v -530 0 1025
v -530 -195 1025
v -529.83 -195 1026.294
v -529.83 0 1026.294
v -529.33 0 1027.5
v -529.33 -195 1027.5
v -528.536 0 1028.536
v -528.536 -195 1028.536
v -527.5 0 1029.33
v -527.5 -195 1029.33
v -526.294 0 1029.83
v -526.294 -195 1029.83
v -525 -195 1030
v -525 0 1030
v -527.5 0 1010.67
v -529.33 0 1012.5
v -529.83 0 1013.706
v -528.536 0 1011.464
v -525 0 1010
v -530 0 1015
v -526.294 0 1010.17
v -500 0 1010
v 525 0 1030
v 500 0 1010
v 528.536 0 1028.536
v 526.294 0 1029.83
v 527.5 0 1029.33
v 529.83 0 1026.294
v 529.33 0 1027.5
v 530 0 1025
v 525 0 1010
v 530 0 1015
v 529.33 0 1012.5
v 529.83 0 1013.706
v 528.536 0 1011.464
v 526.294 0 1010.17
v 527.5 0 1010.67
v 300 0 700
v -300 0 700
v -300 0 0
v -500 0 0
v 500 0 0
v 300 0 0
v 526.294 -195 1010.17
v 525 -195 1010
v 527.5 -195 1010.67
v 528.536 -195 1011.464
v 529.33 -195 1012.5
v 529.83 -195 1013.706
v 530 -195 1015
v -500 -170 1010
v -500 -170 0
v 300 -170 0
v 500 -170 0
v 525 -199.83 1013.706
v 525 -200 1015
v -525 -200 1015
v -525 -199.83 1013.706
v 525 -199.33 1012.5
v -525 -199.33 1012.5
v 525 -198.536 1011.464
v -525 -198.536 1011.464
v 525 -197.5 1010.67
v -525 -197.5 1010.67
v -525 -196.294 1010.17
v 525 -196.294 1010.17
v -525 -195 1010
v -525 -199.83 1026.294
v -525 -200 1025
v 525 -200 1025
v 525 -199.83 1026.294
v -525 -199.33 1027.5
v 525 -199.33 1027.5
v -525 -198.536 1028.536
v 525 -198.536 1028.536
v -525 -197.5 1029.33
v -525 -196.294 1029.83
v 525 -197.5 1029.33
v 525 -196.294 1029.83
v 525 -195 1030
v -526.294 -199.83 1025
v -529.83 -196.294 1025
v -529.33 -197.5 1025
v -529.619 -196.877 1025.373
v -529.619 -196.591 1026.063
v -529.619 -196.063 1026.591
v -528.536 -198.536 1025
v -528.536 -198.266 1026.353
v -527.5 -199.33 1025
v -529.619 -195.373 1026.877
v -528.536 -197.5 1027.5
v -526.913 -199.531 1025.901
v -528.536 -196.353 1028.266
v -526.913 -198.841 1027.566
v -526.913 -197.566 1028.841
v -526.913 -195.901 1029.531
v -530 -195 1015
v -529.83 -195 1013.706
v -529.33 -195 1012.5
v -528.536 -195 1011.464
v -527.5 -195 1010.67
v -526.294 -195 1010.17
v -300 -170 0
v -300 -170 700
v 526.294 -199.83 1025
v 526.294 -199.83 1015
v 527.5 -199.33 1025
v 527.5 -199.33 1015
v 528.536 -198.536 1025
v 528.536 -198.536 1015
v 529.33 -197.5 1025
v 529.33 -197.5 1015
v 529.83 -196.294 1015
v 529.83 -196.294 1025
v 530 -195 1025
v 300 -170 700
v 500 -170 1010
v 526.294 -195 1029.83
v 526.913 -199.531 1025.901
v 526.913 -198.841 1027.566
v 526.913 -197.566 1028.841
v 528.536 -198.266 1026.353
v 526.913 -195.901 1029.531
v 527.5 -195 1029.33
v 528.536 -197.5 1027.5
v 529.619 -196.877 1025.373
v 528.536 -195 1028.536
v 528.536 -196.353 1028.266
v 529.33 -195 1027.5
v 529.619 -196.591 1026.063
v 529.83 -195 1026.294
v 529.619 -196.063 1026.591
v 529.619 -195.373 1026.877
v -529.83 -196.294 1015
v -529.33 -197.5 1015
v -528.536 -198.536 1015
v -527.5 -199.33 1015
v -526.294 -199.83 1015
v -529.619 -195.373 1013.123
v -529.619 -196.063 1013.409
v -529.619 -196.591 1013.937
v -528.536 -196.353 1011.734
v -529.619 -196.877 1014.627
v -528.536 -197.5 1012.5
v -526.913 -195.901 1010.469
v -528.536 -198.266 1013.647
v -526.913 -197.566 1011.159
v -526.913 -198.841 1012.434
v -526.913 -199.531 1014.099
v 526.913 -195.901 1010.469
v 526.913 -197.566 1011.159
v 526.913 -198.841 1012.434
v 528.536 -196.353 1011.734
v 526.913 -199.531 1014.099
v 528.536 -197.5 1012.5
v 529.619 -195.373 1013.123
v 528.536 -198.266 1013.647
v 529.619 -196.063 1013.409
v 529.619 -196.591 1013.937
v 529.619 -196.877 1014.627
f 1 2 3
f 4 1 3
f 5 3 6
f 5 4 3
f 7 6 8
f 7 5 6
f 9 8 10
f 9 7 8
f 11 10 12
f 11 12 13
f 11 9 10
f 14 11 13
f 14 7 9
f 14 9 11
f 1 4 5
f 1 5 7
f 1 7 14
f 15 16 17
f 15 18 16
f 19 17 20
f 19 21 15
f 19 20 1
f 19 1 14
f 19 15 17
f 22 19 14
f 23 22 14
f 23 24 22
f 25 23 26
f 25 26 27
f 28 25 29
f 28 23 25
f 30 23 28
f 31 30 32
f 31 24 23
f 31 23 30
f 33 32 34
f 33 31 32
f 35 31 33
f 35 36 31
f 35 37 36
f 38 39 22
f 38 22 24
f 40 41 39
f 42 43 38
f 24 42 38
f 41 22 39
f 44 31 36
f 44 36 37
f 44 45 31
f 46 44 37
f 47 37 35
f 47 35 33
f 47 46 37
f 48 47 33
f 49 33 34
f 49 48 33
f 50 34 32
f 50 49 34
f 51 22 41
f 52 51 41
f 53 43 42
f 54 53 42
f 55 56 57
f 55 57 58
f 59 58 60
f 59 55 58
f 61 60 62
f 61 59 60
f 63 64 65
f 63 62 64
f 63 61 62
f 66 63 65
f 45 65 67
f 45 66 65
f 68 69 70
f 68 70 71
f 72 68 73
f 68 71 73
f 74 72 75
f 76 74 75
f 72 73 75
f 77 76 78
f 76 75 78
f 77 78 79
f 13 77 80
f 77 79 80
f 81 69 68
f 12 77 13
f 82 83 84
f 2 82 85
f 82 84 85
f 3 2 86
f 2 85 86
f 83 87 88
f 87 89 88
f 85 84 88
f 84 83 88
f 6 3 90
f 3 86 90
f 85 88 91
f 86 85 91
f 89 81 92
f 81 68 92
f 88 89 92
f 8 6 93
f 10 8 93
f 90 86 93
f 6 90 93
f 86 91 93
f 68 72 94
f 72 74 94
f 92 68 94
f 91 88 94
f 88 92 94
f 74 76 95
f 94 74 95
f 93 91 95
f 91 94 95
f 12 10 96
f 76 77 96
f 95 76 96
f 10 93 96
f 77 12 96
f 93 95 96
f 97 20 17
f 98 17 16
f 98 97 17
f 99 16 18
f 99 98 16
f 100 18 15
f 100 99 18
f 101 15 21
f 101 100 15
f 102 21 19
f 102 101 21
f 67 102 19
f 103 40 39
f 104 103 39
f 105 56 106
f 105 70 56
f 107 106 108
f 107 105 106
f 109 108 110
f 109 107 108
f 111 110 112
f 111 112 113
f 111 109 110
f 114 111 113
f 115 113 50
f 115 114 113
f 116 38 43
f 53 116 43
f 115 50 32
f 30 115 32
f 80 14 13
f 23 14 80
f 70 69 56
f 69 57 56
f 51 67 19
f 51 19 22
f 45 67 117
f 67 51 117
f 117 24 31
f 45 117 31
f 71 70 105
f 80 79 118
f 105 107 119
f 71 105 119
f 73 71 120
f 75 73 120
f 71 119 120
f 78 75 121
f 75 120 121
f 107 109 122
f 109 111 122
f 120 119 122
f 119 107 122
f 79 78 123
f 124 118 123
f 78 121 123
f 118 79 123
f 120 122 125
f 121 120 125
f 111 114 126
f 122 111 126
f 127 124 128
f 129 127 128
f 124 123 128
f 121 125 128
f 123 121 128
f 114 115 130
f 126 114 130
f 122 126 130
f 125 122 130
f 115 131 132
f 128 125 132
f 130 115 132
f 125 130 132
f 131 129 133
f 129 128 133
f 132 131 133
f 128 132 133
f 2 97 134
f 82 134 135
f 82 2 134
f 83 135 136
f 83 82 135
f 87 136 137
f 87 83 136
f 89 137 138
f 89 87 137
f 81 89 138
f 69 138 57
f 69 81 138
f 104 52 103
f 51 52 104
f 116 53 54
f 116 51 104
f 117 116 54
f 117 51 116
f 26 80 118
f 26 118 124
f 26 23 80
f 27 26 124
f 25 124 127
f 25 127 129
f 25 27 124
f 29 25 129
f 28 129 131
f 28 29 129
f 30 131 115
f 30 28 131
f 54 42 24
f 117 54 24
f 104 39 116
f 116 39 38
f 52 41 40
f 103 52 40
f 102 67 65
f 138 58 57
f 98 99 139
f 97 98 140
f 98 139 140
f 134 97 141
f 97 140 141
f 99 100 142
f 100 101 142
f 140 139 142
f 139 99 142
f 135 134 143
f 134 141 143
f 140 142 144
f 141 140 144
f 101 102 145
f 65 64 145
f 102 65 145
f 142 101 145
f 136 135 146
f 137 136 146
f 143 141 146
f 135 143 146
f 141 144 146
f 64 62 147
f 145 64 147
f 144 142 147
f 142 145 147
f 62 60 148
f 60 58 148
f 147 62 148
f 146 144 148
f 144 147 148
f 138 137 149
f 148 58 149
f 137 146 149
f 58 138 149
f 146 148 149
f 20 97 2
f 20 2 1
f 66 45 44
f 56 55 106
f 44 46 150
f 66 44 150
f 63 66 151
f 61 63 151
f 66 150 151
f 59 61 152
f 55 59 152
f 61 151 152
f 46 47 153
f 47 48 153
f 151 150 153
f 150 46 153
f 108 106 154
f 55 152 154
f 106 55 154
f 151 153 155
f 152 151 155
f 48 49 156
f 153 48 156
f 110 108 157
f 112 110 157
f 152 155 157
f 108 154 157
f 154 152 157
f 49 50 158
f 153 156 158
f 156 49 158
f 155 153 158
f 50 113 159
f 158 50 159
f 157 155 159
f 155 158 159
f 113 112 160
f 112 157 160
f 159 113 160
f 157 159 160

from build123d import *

# Parameters (mm, degrees)
F1_DEPTH = 170
F2_W     = 1060
F2_H     = 200
F3_DEPTH = 20
F4_R     = 5
F5_R     = 5
F6_R     = 5
F7_R     = 5


with BuildPart() as f1:
    # F0 (on Front) → F1 (new body)
    with BuildSketch(Plane.XZ):
        Polygon((500, 1010), (0, 1010), (-500, 1010), (-500, 0), (-300, 0), (-300, 700), (0, 700), (300, 700), (300, 0), (500, 0), align=None)
    extrude(amount=F1_DEPTH)

    # F2 (on face) → F3 (join)
    with BuildSketch(Plane.XY.offset(1010)):
        with Locations((0, -100)):
            Rectangle(F2_W, F2_H)
    extrude(amount=F3_DEPTH)

    # F4
    f4_edges = [f1.edges().sort_by_distance(p)[0] for p in [
        (0, -200, 1010),
    ]]
    fillet(f4_edges, radius=F4_R)

    # F5
    f5_edges = [f1.edges().sort_by_distance(p)[0] for p in [
        (0, -200, 1030),
    ]]
    fillet(f5_edges, radius=F5_R)

    # F6
    f6_edges = [f1.edges().sort_by_distance(p)[0] for p in [
        (530, -97.5, 1030),
    ]]
    fillet(f6_edges, radius=F6_R)

    # F7
    f7_edges = [f1.edges().sort_by_distance(p)[0] for p in [
        (-530, -97.5, 1030),
    ]]
    fillet(f7_edges, radius=F7_R)


solid = f1.part
